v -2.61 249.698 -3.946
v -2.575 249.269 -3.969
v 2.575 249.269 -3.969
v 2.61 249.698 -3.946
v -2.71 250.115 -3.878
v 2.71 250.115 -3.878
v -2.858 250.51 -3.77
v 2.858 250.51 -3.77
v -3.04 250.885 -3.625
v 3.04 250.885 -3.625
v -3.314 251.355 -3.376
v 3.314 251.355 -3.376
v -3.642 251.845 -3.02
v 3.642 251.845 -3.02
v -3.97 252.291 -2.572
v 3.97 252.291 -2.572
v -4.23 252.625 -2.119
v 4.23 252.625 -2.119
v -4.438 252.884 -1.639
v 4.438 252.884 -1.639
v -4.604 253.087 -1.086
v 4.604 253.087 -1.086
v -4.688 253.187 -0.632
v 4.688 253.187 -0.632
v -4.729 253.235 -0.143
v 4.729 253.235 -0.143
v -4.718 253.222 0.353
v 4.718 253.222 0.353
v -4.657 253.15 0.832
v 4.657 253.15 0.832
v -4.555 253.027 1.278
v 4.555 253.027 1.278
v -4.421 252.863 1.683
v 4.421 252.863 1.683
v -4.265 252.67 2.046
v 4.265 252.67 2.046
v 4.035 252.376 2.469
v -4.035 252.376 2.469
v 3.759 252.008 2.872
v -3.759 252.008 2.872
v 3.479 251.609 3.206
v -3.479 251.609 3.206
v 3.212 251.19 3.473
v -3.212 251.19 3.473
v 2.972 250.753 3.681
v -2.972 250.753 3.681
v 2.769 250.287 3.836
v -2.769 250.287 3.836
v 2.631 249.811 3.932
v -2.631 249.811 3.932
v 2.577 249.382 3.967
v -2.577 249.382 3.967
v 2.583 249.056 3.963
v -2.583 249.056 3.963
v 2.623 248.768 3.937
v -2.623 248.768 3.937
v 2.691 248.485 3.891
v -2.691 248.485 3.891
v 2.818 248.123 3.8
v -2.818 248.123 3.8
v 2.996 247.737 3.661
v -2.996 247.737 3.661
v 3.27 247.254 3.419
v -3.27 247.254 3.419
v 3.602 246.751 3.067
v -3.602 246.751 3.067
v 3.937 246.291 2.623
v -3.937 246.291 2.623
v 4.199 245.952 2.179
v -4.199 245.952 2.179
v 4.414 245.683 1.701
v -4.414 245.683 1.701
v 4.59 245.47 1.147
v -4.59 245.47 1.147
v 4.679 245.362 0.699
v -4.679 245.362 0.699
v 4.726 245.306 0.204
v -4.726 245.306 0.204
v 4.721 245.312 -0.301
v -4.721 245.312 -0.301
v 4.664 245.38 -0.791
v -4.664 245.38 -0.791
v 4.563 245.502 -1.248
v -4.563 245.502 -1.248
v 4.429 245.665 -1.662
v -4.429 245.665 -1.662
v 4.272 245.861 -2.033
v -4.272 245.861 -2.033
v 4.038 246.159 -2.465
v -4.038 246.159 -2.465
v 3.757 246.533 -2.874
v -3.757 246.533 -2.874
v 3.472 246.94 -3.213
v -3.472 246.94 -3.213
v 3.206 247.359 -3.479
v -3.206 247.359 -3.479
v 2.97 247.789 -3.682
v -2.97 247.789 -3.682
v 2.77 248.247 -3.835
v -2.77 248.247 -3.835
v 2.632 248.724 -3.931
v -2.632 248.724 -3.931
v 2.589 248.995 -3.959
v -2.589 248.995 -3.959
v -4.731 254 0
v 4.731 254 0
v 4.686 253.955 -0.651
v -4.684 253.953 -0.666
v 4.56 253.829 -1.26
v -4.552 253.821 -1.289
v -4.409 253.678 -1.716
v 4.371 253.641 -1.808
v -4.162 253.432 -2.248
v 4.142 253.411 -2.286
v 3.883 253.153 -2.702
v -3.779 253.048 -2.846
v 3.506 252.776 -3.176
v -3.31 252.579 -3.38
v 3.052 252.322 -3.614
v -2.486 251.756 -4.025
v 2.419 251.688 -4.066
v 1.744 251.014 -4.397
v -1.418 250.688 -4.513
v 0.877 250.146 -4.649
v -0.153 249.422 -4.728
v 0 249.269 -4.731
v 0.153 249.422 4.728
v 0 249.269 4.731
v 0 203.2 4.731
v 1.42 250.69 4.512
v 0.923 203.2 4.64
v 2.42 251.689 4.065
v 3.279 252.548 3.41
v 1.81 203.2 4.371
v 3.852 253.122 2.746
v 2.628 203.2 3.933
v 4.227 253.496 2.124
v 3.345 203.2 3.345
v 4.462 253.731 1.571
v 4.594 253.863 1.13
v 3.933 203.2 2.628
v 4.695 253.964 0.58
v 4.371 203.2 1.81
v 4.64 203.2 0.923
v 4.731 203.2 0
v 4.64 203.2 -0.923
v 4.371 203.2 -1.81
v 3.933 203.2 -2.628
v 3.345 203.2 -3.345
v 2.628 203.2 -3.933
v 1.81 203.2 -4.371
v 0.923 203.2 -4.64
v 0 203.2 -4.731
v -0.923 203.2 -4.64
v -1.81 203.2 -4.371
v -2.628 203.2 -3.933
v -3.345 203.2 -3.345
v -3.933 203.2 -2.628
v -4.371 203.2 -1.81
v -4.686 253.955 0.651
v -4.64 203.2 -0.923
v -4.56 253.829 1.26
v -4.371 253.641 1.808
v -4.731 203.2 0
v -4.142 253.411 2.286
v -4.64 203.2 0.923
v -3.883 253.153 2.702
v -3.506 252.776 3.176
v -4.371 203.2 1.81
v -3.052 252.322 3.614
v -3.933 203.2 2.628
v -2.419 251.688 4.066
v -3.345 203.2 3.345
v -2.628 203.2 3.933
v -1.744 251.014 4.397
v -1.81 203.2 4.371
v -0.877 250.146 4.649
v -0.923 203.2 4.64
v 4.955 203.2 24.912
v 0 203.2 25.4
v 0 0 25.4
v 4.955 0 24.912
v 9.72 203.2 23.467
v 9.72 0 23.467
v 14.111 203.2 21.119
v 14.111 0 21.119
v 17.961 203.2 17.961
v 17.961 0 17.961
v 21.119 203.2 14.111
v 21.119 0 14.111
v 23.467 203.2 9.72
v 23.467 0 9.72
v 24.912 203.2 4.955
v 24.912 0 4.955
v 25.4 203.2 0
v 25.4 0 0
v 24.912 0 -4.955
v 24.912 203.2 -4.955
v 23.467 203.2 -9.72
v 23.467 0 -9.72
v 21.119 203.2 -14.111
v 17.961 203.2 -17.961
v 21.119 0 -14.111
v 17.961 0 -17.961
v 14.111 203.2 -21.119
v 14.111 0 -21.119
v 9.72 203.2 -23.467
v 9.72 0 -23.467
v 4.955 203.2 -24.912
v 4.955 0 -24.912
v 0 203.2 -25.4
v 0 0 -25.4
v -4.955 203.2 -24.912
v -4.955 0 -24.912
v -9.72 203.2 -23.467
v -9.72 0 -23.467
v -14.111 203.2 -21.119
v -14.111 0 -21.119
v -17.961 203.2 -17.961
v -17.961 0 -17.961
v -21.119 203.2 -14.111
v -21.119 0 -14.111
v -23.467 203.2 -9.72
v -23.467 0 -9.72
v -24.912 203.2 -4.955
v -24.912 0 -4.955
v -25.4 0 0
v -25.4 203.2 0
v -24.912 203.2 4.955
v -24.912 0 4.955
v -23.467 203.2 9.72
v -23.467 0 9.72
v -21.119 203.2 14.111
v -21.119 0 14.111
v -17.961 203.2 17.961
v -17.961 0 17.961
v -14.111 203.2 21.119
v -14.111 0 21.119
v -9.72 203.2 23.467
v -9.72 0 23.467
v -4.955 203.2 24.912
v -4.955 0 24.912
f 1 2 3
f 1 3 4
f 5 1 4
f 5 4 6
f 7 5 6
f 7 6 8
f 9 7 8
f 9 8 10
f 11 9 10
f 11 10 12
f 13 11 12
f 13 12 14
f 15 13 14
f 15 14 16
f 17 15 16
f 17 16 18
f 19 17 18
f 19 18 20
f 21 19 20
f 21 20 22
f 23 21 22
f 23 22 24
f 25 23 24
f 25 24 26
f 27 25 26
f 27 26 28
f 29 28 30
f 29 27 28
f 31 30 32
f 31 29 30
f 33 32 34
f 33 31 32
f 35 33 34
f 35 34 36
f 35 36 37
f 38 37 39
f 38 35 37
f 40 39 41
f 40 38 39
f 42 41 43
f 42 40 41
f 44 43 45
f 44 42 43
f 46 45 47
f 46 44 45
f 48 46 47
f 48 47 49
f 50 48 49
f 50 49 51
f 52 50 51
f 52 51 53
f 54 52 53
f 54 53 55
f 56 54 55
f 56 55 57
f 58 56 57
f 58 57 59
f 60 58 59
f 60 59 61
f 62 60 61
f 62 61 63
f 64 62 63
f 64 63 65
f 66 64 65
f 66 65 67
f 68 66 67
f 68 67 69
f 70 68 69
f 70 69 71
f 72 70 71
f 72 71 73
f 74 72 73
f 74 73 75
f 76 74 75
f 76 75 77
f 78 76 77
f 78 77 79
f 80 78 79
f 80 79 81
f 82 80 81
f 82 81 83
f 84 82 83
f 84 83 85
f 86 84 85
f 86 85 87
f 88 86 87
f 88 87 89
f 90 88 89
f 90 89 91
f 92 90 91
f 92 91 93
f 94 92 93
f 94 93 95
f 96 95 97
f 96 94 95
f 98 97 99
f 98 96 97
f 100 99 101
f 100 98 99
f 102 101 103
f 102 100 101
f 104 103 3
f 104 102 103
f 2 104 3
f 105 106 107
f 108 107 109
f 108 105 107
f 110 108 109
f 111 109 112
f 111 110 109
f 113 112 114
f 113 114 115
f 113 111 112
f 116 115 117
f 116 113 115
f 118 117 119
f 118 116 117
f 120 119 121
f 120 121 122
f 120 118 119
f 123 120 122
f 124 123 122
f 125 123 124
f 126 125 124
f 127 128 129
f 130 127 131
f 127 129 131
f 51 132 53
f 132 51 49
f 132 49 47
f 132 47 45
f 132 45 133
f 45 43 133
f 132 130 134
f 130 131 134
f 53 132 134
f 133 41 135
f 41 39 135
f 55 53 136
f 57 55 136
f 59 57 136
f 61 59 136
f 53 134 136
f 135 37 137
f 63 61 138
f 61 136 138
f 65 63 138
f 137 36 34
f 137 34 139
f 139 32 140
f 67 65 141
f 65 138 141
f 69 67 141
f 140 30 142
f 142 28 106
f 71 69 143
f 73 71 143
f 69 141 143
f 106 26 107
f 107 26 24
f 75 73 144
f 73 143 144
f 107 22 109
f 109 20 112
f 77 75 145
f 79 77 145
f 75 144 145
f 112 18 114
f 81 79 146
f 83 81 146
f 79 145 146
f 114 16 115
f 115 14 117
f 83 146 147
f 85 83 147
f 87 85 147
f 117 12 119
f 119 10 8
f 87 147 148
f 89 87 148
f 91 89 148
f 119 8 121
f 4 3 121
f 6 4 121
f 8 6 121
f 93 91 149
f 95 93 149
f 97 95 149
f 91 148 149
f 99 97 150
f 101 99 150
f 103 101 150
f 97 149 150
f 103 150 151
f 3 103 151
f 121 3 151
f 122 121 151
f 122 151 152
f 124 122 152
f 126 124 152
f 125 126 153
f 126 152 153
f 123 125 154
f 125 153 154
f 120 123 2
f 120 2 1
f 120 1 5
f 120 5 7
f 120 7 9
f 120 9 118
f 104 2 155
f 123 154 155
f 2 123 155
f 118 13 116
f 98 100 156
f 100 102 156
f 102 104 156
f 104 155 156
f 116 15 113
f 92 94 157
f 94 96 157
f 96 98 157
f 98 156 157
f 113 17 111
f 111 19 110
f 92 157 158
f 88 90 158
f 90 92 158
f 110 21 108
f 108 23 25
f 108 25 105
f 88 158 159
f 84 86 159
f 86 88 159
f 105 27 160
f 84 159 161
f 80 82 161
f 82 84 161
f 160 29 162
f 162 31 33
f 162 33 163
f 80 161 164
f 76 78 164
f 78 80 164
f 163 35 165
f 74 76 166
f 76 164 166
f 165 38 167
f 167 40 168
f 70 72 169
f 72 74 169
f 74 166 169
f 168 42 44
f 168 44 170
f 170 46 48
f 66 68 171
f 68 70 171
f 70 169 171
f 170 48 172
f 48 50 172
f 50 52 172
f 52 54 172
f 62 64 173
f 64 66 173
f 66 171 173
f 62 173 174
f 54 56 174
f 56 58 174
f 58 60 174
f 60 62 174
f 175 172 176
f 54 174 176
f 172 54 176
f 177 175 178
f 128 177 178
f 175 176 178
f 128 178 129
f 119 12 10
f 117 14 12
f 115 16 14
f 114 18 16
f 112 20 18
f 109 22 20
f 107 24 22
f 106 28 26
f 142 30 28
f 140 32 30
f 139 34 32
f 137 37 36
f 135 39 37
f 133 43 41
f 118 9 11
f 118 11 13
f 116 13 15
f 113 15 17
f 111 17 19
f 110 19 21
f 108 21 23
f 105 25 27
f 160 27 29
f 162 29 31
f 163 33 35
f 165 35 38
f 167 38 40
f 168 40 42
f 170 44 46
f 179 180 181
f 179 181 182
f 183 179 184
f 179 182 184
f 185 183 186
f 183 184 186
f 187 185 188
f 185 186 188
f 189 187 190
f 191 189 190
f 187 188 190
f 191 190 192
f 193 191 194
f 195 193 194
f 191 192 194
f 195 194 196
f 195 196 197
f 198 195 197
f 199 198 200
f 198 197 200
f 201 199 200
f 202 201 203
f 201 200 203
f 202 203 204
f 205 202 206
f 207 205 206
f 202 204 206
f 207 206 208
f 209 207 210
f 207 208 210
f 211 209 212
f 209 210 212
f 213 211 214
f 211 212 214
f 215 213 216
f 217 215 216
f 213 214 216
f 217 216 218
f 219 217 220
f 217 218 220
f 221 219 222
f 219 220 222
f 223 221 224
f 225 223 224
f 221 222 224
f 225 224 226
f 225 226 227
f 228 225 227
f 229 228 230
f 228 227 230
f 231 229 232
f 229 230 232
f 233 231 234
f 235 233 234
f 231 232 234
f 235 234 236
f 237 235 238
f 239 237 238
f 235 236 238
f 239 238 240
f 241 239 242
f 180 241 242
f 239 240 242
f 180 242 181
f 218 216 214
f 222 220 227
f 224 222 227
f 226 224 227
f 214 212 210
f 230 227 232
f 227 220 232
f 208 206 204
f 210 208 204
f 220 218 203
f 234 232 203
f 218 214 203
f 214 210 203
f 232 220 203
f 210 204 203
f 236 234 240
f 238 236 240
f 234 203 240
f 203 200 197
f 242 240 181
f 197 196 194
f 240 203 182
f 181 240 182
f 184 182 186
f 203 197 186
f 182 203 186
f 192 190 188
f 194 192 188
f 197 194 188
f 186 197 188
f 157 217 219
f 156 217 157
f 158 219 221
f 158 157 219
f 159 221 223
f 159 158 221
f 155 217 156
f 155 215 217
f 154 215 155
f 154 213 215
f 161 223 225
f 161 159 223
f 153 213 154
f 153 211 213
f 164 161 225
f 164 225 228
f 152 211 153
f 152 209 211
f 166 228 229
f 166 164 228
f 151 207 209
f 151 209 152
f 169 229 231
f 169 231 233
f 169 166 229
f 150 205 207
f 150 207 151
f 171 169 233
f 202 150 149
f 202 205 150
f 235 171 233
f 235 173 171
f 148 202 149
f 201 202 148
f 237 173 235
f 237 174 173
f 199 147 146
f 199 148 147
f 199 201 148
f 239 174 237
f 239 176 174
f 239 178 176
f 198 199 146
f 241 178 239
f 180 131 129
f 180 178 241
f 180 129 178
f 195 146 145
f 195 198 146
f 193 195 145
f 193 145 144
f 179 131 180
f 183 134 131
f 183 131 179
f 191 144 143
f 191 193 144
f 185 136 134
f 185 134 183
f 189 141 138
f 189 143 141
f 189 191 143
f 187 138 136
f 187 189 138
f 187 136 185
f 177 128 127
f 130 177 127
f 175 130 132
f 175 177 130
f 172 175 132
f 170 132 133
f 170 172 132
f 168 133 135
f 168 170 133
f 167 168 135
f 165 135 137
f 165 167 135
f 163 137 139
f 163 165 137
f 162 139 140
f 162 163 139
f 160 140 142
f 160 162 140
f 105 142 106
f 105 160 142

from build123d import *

# Parameters (mm, degrees)
SKETCH1_R               = 25.4
BOSS_EXTRUDE1_DEPTH     = 203.2
SKETCH2_R               = 4.73075
BOSS_EXTRUDE2_DEPTH     = 50.8
CUT_EXTRUDE1_DEPTH      = 257.527425434
CUT_EXTRUDE1_DEPTH_BACK = 257.527425434
SKETCH3_R               = 3.96875


with BuildPart() as part:
    # Sketch1 → Boss-Extrude1 (new body)
    with BuildSketch(Plane(origin=(0, 0, 0), x_dir=(1, 0, 0), z_dir=(0, 1, 0))):
        with Locations(Location((0, 0, 0), (0, 0, 270))):
            Circle(SKETCH1_R)
    extrude(amount=BOSS_EXTRUDE1_DEPTH)

    # Sketch2 → Boss-Extrude2 (add)
    with BuildSketch(Plane(origin=(0, 203.2, 0), x_dir=(1, 0, 0), z_dir=(0, 1, 0))):
        with Locations(Location((0, 0, 0), (0, 0, 270))):
            Circle(SKETCH2_R)
    extrude(amount=BOSS_EXTRUDE2_DEPTH)

    # Sketch3 → Cut-Extrude1 (cut, two sides: drawn at the far end of the back side and taken through both)
    with BuildSketch(Plane(origin=(0, 0, 0), x_dir=(0, 0, -1), z_dir=(1, 0, 0)).offset(-CUT_EXTRUDE1_DEPTH_BACK)):
        with Locations((0, 249.26925)):
            Circle(SKETCH3_R)
        with BuildLine():
            Line((-4.73075, 254), (-4.73075, 249.26925))
            ThreePointArc((-4.73075, 249.26925), (-3.345145405, 252.614395405), (0, 254))
            Line((0, 254), (-4.73075, 254))
        make_face()
        with BuildLine():
            ThreePointArc((0, 254), (3.345145405, 252.614395405), (4.73075, 249.26925))
            Line((4.73075, 249.26925), (4.73075, 254))
            Line((4.73075, 254), (0, 254))
        make_face()
    extrude(amount=CUT_EXTRUDE1_DEPTH + CUT_EXTRUDE1_DEPTH_BACK, mode=Mode.SUBTRACT)


solid = part.part
